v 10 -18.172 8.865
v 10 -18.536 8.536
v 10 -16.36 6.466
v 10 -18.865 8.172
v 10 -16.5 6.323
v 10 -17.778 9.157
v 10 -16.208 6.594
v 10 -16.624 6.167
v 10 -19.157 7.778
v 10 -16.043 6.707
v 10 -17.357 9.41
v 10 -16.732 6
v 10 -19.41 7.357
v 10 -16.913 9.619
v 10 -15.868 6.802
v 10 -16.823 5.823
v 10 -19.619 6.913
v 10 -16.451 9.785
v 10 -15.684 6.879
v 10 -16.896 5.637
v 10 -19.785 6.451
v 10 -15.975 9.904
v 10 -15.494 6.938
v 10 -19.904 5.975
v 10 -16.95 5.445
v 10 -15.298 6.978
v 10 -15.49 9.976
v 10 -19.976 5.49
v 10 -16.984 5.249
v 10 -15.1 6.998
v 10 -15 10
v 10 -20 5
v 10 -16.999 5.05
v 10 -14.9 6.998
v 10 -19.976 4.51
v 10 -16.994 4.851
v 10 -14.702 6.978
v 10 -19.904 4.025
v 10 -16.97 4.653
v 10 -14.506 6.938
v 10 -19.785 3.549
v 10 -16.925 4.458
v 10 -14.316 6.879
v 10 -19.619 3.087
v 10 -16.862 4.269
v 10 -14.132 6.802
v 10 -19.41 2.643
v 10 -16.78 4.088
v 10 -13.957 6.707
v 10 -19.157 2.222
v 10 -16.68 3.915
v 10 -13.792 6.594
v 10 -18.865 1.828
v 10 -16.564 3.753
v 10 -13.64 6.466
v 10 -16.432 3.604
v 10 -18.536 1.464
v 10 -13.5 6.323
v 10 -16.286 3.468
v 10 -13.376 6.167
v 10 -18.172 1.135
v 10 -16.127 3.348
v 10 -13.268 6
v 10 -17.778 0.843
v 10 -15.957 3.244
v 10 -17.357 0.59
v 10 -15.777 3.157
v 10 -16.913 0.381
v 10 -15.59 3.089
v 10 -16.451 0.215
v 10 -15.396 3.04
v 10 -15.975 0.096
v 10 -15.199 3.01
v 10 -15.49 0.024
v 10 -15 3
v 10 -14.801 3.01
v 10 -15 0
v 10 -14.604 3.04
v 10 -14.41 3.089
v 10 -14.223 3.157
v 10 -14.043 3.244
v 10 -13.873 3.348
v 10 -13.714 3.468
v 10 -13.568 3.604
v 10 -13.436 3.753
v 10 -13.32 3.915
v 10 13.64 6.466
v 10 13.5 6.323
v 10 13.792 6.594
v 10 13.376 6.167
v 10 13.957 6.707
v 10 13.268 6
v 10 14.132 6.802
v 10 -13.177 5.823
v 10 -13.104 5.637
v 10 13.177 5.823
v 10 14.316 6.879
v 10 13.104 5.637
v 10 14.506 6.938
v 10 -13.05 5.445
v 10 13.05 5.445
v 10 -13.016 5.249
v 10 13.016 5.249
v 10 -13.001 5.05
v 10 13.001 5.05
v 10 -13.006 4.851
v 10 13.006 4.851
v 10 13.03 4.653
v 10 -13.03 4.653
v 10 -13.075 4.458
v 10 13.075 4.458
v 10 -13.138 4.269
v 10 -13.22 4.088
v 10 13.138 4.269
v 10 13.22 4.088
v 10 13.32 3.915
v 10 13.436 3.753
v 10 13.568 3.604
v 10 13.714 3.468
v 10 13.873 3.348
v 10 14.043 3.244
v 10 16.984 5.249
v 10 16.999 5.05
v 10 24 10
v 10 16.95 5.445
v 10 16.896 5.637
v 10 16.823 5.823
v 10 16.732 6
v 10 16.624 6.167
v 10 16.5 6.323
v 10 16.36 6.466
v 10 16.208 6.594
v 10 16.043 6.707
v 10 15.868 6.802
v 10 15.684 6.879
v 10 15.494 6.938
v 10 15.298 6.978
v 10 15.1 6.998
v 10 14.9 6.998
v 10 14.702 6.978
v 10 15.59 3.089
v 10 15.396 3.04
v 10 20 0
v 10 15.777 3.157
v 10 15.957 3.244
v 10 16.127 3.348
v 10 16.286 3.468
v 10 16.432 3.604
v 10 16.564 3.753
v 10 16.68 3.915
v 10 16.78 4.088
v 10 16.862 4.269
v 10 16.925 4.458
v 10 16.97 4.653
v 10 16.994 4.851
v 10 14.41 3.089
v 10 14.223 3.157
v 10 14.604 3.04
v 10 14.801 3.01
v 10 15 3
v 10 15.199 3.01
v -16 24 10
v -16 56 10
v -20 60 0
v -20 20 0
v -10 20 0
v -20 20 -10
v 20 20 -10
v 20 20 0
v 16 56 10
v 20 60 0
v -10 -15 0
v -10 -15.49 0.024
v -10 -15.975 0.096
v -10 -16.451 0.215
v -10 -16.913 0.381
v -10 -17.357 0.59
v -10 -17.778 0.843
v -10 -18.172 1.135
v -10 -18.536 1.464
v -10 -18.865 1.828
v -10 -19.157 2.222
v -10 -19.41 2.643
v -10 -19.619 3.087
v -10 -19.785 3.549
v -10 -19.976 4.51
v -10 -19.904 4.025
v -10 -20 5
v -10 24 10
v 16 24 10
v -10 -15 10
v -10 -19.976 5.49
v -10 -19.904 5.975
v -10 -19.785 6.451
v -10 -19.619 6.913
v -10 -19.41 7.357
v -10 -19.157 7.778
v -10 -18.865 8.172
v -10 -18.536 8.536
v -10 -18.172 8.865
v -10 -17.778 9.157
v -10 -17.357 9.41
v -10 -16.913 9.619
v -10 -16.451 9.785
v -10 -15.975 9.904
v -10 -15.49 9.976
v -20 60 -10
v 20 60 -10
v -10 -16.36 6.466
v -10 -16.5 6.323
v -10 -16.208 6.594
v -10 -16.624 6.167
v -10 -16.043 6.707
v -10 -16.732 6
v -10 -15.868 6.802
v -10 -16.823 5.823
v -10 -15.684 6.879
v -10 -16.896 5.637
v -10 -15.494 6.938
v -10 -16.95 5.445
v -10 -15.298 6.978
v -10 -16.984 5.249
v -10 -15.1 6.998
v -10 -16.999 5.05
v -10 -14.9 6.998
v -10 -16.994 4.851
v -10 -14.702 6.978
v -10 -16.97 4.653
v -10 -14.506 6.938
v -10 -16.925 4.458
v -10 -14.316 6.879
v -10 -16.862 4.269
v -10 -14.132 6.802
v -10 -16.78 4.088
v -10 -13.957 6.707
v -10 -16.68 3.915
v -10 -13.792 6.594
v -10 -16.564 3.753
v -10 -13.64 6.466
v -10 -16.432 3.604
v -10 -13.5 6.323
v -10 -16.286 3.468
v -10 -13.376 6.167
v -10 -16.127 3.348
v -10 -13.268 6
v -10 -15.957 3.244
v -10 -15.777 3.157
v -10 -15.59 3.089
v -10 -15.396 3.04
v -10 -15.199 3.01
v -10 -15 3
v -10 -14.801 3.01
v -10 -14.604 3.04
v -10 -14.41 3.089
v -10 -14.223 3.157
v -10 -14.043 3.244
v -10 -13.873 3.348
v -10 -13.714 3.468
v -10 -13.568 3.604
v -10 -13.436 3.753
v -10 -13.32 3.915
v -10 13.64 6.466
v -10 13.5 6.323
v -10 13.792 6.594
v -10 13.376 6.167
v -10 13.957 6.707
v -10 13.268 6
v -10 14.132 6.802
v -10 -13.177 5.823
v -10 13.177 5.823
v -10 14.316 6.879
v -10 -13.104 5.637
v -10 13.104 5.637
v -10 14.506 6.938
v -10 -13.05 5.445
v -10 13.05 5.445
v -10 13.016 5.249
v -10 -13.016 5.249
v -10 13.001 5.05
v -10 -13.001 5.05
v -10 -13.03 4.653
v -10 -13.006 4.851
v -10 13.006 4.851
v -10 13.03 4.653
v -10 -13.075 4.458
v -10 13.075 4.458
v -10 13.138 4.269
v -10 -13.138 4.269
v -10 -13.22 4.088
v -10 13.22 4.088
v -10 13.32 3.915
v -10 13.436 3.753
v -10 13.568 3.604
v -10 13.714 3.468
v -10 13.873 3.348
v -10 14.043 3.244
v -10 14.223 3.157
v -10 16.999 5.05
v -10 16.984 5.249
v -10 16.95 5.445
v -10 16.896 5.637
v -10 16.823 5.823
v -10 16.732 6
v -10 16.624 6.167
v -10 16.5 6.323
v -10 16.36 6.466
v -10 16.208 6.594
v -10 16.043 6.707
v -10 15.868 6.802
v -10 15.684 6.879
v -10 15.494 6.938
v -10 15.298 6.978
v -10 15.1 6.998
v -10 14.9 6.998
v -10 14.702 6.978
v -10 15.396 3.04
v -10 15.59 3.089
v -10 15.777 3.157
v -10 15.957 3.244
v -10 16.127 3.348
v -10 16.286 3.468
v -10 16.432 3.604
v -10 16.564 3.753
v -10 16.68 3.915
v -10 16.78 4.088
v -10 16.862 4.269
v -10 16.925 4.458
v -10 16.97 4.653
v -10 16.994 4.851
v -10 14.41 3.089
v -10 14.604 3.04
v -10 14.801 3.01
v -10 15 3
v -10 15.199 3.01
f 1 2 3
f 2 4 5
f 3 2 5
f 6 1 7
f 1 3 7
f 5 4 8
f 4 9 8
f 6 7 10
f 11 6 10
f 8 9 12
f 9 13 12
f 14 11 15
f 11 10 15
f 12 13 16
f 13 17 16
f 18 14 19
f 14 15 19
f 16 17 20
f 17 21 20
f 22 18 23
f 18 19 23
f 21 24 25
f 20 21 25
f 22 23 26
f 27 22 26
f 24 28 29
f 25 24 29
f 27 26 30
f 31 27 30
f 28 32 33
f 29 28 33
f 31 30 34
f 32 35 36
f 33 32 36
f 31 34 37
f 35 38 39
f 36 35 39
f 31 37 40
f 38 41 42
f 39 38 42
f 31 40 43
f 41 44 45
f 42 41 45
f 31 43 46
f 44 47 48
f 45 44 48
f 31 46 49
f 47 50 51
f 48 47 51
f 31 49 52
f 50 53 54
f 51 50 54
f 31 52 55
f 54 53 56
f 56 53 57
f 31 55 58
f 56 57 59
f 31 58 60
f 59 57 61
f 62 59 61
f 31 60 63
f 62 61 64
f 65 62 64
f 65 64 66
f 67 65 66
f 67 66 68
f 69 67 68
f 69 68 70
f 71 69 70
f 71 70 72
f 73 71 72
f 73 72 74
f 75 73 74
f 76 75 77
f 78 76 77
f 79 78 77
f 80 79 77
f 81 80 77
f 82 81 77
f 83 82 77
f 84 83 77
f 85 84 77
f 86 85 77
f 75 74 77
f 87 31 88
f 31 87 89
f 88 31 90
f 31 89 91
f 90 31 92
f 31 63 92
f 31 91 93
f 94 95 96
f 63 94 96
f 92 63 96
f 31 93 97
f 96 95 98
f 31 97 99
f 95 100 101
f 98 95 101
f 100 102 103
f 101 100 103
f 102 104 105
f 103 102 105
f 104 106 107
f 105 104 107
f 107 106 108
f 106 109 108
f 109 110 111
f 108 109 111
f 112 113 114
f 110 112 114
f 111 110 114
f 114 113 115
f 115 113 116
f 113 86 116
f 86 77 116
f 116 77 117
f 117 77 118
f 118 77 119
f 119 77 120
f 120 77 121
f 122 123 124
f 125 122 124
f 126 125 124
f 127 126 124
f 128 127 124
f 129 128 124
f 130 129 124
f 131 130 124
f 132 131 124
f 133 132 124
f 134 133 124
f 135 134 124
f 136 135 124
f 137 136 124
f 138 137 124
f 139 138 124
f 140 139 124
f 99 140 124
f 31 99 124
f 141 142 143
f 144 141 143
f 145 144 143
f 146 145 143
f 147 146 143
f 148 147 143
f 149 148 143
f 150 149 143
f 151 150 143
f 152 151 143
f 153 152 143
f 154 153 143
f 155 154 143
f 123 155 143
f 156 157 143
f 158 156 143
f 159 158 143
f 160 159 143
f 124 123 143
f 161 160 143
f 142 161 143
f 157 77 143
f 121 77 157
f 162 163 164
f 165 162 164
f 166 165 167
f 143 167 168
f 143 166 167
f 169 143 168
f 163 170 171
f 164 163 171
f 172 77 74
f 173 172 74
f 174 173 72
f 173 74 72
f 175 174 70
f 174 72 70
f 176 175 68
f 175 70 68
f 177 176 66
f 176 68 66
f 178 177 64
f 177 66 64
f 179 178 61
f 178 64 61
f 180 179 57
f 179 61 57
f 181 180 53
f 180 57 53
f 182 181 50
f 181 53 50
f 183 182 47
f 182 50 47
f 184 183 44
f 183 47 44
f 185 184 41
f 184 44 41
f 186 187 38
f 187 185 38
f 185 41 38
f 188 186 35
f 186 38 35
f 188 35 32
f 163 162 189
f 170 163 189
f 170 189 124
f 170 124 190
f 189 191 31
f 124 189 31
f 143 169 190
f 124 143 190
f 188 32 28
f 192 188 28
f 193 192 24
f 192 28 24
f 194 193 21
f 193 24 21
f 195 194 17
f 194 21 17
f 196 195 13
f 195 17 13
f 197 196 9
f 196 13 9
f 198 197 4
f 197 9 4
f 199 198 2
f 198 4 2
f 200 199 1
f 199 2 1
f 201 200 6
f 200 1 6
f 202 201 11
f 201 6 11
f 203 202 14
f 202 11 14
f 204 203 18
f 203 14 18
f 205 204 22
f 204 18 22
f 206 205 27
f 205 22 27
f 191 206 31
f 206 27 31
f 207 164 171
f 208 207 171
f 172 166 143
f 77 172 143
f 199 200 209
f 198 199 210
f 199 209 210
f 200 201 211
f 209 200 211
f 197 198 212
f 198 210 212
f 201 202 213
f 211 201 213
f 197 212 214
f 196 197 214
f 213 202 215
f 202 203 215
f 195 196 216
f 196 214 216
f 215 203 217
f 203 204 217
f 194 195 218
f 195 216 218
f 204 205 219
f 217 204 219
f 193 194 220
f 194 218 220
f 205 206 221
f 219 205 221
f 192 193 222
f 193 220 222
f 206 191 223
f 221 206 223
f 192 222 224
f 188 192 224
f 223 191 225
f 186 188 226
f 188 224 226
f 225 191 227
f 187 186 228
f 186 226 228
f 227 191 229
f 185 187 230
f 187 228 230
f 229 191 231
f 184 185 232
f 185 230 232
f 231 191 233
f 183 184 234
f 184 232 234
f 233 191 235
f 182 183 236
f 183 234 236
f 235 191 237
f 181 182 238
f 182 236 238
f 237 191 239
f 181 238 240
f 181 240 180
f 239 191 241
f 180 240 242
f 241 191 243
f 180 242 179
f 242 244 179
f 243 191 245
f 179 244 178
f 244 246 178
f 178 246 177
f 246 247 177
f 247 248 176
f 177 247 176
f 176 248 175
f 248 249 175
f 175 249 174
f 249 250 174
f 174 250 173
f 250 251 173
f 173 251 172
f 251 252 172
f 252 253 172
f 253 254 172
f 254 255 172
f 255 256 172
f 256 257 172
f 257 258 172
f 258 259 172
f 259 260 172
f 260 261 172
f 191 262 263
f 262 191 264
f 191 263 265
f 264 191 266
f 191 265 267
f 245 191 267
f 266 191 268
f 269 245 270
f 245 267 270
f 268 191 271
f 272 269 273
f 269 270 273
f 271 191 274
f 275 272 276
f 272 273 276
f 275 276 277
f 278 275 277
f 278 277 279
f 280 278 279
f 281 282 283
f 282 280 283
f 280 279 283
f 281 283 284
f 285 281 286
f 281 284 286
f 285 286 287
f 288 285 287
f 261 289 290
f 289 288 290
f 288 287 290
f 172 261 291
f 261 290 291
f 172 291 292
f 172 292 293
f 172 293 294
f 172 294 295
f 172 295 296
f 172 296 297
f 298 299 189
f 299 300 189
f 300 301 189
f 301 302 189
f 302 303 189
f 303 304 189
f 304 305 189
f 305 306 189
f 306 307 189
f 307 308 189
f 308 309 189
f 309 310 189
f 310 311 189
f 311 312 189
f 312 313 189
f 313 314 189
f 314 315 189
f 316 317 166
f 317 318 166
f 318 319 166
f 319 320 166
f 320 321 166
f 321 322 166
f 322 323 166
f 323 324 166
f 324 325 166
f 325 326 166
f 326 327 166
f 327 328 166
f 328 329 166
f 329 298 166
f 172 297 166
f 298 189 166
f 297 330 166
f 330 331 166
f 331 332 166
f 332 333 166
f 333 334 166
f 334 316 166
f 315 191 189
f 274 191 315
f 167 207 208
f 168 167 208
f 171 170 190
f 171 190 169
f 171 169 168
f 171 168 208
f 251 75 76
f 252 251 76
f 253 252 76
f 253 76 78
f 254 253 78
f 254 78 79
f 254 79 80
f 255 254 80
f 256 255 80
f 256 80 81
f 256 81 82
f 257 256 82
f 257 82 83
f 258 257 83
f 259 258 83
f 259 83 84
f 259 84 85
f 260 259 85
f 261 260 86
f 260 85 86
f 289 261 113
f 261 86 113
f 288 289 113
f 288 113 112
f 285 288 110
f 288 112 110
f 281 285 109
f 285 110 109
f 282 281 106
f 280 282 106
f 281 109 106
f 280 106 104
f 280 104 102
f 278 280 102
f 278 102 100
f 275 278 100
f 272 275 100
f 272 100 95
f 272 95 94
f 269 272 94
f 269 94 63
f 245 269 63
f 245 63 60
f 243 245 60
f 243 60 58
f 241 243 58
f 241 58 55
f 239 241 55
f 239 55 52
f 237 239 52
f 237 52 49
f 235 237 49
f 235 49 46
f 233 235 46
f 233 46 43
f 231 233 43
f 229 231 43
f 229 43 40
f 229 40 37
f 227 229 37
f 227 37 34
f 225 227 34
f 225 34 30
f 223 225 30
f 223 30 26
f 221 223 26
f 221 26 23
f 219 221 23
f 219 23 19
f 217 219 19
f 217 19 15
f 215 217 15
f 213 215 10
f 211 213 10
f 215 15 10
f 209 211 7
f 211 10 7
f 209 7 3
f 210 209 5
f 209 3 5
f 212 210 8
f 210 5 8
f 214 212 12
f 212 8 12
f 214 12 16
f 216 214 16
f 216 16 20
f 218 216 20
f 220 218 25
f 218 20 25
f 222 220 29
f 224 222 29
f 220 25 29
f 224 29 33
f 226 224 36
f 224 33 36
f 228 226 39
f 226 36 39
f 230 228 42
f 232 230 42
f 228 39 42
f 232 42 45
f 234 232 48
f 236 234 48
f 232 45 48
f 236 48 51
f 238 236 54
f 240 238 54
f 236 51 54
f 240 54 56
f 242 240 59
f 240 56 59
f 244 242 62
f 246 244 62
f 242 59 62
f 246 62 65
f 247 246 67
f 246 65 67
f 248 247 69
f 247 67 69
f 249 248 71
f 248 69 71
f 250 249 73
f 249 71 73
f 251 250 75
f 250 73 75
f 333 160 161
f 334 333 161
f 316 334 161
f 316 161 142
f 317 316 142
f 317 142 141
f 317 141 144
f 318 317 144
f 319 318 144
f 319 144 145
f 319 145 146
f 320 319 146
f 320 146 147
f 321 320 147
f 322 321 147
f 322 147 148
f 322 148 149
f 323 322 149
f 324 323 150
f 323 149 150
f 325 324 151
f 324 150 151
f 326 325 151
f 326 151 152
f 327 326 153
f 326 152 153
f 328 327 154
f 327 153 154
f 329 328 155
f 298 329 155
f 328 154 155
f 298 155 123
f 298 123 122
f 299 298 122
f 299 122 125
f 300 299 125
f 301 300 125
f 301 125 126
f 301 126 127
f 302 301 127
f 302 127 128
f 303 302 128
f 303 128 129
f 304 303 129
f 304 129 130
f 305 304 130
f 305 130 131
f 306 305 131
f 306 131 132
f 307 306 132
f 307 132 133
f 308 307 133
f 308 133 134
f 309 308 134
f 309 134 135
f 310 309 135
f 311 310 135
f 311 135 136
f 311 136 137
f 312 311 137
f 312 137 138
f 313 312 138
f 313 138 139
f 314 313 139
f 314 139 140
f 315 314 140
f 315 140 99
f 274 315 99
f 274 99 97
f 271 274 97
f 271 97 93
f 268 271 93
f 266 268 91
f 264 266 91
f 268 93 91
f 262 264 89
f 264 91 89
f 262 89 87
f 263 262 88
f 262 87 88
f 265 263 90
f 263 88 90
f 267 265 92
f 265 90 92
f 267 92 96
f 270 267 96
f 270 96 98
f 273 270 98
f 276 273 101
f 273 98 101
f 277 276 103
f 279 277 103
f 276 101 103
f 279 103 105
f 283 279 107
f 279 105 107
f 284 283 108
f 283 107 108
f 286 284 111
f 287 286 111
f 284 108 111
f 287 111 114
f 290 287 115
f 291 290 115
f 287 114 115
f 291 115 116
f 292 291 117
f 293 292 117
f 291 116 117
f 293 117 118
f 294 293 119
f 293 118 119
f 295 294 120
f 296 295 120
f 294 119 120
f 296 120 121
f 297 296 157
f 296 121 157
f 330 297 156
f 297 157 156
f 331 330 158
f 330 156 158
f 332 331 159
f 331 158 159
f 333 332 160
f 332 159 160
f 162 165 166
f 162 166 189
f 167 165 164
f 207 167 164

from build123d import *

# Parameters (mm, degrees)
CROQUIS1_W              = 20
CROQUIS1_H              = 40
SALIENTE_EXTRUIR1_DEPTH = 10
CROQUIS2_R              = 2
CORTAR_EXTRUIR1_DEPTH   = 31
CROQUIS3_W              = 40
CROQUIS3_H              = 10
SALIENTE_EXTRUIR2_DEPTH = 10
CROQUIS4_W              = 40
CROQUIS4_H              = 40
SALIENTE_EXTRUIR3_DEPTH = 20
CORTAR_EXTRUIR3_DEPTH   = 10
CORTAR_EXTRUIR4_DEPTH   = 10
CORTAR_EXTRUIR5_DEPTH   = 41
CORTAR_EXTRUIR6_DEPTH   = 40
CORTAR_EXTRUIR7_DEPTH   = 31


with BuildPart() as part:
    # Croquis1 → Saliente-Extruir1 (new body)
    with BuildSketch(Plane.XY):
        Rectangle(CROQUIS1_W, CROQUIS1_H)
        Polygon((0, 20), (10, 20), (20, 20), (20, 50), (0, 50), align=None)
        Polygon((-20, 20), (-10, 20), (0, 20), (0, 50), (-20, 50), align=None)
    extrude(amount=SALIENTE_EXTRUIR1_DEPTH)

    # Croquis2 → Cortar-Extruir1 (cut, through all)
    with BuildSketch(Plane(origin=(10, 0, 0), x_dir=(0, 0, -1), z_dir=(1, 0, 0))):
        with Locations((-5, -15)):
            Circle(CROQUIS2_R)
        with Locations((-5, 15)):
            Circle(CROQUIS2_R)
    extrude(amount=-CORTAR_EXTRUIR1_DEPTH, mode=Mode.SUBTRACT)

    # Croquis3 → Saliente-Extruir2 (add)
    with BuildSketch(Plane(origin=(0, 50, 0), x_dir=(1, 0, 0), z_dir=(0, 1, 0))):
        with Locations((0, -5)):
            Rectangle(CROQUIS3_W, CROQUIS3_H)
    extrude(amount=SALIENTE_EXTRUIR2_DEPTH)

    # Croquis4 → Saliente-Extruir3 (add)
    with BuildSketch(Plane.XY.offset(10)):
        with Locations((0, 40)):
            Rectangle(CROQUIS4_W, CROQUIS4_H)
    extrude(amount=-SALIENTE_EXTRUIR3_DEPTH)

    # Croquis6 → Cortar-Extruir3 (cut)
    with BuildSketch(Plane(origin=(20, 0, 0), x_dir=(0, 0, -1), z_dir=(1, 0, 0))):
        Polygon((-10, 20), (0, 20), (-10, 24), align=None)
    extrude(amount=-CORTAR_EXTRUIR3_DEPTH, mode=Mode.SUBTRACT)

    # Croquis7 → Cortar-Extruir4 (cut)
    with BuildSketch(Plane.ZY.offset(20)):
        Polygon((0, 20), (10, 24), (10, 20), align=None)
    extrude(amount=-CORTAR_EXTRUIR4_DEPTH, mode=Mode.SUBTRACT)

    # Croquis8 → Cortar-Extruir5 (cut, through all)
    with BuildSketch(Plane(origin=(20, 0, 0), x_dir=(0, 0, -1), z_dir=(1, 0, 0))):
        Polygon((-10, 56), (0, 60), (-10, 60), align=None)
    extrude(amount=-CORTAR_EXTRUIR5_DEPTH, mode=Mode.SUBTRACT)

    # Croquis9 → Cortar-Extruir6 (cut)
    with BuildSketch(Plane(origin=(0, 60, 0), x_dir=(1, 0, 0), z_dir=(0, 1, 0))):
        Polygon((-20, 0), (-20, -10), (-16, -10), align=None)
        Polygon((20, 0), (20, -10), (16, -10), align=None)
    extrude(amount=-CORTAR_EXTRUIR6_DEPTH, mode=Mode.SUBTRACT)

    # Croquis10 → Cortar-Extruir7 (cut, through all)
    with BuildSketch(Plane(origin=(10, 0, 0), x_dir=(0, 0, -1), z_dir=(1, 0, 0))):
        with BuildLine():
            ThreePointArc((0, -15), (-1.464466094, -18.535533906), (-5, -20))
            Line((-5, -20), (0, -20))
            Line((0, -20), (0, -15))
        make_face()
        with BuildLine():
            ThreePointArc((-5, -20), (-8.535533906, -18.535533906), (-10, -15))
            Line((-10, -15), (-10, -20))
            Line((-10, -20), (-5, -20))
        make_face()
    extrude(amount=-CORTAR_EXTRUIR7_DEPTH, mode=Mode.SUBTRACT)


solid = part.part
